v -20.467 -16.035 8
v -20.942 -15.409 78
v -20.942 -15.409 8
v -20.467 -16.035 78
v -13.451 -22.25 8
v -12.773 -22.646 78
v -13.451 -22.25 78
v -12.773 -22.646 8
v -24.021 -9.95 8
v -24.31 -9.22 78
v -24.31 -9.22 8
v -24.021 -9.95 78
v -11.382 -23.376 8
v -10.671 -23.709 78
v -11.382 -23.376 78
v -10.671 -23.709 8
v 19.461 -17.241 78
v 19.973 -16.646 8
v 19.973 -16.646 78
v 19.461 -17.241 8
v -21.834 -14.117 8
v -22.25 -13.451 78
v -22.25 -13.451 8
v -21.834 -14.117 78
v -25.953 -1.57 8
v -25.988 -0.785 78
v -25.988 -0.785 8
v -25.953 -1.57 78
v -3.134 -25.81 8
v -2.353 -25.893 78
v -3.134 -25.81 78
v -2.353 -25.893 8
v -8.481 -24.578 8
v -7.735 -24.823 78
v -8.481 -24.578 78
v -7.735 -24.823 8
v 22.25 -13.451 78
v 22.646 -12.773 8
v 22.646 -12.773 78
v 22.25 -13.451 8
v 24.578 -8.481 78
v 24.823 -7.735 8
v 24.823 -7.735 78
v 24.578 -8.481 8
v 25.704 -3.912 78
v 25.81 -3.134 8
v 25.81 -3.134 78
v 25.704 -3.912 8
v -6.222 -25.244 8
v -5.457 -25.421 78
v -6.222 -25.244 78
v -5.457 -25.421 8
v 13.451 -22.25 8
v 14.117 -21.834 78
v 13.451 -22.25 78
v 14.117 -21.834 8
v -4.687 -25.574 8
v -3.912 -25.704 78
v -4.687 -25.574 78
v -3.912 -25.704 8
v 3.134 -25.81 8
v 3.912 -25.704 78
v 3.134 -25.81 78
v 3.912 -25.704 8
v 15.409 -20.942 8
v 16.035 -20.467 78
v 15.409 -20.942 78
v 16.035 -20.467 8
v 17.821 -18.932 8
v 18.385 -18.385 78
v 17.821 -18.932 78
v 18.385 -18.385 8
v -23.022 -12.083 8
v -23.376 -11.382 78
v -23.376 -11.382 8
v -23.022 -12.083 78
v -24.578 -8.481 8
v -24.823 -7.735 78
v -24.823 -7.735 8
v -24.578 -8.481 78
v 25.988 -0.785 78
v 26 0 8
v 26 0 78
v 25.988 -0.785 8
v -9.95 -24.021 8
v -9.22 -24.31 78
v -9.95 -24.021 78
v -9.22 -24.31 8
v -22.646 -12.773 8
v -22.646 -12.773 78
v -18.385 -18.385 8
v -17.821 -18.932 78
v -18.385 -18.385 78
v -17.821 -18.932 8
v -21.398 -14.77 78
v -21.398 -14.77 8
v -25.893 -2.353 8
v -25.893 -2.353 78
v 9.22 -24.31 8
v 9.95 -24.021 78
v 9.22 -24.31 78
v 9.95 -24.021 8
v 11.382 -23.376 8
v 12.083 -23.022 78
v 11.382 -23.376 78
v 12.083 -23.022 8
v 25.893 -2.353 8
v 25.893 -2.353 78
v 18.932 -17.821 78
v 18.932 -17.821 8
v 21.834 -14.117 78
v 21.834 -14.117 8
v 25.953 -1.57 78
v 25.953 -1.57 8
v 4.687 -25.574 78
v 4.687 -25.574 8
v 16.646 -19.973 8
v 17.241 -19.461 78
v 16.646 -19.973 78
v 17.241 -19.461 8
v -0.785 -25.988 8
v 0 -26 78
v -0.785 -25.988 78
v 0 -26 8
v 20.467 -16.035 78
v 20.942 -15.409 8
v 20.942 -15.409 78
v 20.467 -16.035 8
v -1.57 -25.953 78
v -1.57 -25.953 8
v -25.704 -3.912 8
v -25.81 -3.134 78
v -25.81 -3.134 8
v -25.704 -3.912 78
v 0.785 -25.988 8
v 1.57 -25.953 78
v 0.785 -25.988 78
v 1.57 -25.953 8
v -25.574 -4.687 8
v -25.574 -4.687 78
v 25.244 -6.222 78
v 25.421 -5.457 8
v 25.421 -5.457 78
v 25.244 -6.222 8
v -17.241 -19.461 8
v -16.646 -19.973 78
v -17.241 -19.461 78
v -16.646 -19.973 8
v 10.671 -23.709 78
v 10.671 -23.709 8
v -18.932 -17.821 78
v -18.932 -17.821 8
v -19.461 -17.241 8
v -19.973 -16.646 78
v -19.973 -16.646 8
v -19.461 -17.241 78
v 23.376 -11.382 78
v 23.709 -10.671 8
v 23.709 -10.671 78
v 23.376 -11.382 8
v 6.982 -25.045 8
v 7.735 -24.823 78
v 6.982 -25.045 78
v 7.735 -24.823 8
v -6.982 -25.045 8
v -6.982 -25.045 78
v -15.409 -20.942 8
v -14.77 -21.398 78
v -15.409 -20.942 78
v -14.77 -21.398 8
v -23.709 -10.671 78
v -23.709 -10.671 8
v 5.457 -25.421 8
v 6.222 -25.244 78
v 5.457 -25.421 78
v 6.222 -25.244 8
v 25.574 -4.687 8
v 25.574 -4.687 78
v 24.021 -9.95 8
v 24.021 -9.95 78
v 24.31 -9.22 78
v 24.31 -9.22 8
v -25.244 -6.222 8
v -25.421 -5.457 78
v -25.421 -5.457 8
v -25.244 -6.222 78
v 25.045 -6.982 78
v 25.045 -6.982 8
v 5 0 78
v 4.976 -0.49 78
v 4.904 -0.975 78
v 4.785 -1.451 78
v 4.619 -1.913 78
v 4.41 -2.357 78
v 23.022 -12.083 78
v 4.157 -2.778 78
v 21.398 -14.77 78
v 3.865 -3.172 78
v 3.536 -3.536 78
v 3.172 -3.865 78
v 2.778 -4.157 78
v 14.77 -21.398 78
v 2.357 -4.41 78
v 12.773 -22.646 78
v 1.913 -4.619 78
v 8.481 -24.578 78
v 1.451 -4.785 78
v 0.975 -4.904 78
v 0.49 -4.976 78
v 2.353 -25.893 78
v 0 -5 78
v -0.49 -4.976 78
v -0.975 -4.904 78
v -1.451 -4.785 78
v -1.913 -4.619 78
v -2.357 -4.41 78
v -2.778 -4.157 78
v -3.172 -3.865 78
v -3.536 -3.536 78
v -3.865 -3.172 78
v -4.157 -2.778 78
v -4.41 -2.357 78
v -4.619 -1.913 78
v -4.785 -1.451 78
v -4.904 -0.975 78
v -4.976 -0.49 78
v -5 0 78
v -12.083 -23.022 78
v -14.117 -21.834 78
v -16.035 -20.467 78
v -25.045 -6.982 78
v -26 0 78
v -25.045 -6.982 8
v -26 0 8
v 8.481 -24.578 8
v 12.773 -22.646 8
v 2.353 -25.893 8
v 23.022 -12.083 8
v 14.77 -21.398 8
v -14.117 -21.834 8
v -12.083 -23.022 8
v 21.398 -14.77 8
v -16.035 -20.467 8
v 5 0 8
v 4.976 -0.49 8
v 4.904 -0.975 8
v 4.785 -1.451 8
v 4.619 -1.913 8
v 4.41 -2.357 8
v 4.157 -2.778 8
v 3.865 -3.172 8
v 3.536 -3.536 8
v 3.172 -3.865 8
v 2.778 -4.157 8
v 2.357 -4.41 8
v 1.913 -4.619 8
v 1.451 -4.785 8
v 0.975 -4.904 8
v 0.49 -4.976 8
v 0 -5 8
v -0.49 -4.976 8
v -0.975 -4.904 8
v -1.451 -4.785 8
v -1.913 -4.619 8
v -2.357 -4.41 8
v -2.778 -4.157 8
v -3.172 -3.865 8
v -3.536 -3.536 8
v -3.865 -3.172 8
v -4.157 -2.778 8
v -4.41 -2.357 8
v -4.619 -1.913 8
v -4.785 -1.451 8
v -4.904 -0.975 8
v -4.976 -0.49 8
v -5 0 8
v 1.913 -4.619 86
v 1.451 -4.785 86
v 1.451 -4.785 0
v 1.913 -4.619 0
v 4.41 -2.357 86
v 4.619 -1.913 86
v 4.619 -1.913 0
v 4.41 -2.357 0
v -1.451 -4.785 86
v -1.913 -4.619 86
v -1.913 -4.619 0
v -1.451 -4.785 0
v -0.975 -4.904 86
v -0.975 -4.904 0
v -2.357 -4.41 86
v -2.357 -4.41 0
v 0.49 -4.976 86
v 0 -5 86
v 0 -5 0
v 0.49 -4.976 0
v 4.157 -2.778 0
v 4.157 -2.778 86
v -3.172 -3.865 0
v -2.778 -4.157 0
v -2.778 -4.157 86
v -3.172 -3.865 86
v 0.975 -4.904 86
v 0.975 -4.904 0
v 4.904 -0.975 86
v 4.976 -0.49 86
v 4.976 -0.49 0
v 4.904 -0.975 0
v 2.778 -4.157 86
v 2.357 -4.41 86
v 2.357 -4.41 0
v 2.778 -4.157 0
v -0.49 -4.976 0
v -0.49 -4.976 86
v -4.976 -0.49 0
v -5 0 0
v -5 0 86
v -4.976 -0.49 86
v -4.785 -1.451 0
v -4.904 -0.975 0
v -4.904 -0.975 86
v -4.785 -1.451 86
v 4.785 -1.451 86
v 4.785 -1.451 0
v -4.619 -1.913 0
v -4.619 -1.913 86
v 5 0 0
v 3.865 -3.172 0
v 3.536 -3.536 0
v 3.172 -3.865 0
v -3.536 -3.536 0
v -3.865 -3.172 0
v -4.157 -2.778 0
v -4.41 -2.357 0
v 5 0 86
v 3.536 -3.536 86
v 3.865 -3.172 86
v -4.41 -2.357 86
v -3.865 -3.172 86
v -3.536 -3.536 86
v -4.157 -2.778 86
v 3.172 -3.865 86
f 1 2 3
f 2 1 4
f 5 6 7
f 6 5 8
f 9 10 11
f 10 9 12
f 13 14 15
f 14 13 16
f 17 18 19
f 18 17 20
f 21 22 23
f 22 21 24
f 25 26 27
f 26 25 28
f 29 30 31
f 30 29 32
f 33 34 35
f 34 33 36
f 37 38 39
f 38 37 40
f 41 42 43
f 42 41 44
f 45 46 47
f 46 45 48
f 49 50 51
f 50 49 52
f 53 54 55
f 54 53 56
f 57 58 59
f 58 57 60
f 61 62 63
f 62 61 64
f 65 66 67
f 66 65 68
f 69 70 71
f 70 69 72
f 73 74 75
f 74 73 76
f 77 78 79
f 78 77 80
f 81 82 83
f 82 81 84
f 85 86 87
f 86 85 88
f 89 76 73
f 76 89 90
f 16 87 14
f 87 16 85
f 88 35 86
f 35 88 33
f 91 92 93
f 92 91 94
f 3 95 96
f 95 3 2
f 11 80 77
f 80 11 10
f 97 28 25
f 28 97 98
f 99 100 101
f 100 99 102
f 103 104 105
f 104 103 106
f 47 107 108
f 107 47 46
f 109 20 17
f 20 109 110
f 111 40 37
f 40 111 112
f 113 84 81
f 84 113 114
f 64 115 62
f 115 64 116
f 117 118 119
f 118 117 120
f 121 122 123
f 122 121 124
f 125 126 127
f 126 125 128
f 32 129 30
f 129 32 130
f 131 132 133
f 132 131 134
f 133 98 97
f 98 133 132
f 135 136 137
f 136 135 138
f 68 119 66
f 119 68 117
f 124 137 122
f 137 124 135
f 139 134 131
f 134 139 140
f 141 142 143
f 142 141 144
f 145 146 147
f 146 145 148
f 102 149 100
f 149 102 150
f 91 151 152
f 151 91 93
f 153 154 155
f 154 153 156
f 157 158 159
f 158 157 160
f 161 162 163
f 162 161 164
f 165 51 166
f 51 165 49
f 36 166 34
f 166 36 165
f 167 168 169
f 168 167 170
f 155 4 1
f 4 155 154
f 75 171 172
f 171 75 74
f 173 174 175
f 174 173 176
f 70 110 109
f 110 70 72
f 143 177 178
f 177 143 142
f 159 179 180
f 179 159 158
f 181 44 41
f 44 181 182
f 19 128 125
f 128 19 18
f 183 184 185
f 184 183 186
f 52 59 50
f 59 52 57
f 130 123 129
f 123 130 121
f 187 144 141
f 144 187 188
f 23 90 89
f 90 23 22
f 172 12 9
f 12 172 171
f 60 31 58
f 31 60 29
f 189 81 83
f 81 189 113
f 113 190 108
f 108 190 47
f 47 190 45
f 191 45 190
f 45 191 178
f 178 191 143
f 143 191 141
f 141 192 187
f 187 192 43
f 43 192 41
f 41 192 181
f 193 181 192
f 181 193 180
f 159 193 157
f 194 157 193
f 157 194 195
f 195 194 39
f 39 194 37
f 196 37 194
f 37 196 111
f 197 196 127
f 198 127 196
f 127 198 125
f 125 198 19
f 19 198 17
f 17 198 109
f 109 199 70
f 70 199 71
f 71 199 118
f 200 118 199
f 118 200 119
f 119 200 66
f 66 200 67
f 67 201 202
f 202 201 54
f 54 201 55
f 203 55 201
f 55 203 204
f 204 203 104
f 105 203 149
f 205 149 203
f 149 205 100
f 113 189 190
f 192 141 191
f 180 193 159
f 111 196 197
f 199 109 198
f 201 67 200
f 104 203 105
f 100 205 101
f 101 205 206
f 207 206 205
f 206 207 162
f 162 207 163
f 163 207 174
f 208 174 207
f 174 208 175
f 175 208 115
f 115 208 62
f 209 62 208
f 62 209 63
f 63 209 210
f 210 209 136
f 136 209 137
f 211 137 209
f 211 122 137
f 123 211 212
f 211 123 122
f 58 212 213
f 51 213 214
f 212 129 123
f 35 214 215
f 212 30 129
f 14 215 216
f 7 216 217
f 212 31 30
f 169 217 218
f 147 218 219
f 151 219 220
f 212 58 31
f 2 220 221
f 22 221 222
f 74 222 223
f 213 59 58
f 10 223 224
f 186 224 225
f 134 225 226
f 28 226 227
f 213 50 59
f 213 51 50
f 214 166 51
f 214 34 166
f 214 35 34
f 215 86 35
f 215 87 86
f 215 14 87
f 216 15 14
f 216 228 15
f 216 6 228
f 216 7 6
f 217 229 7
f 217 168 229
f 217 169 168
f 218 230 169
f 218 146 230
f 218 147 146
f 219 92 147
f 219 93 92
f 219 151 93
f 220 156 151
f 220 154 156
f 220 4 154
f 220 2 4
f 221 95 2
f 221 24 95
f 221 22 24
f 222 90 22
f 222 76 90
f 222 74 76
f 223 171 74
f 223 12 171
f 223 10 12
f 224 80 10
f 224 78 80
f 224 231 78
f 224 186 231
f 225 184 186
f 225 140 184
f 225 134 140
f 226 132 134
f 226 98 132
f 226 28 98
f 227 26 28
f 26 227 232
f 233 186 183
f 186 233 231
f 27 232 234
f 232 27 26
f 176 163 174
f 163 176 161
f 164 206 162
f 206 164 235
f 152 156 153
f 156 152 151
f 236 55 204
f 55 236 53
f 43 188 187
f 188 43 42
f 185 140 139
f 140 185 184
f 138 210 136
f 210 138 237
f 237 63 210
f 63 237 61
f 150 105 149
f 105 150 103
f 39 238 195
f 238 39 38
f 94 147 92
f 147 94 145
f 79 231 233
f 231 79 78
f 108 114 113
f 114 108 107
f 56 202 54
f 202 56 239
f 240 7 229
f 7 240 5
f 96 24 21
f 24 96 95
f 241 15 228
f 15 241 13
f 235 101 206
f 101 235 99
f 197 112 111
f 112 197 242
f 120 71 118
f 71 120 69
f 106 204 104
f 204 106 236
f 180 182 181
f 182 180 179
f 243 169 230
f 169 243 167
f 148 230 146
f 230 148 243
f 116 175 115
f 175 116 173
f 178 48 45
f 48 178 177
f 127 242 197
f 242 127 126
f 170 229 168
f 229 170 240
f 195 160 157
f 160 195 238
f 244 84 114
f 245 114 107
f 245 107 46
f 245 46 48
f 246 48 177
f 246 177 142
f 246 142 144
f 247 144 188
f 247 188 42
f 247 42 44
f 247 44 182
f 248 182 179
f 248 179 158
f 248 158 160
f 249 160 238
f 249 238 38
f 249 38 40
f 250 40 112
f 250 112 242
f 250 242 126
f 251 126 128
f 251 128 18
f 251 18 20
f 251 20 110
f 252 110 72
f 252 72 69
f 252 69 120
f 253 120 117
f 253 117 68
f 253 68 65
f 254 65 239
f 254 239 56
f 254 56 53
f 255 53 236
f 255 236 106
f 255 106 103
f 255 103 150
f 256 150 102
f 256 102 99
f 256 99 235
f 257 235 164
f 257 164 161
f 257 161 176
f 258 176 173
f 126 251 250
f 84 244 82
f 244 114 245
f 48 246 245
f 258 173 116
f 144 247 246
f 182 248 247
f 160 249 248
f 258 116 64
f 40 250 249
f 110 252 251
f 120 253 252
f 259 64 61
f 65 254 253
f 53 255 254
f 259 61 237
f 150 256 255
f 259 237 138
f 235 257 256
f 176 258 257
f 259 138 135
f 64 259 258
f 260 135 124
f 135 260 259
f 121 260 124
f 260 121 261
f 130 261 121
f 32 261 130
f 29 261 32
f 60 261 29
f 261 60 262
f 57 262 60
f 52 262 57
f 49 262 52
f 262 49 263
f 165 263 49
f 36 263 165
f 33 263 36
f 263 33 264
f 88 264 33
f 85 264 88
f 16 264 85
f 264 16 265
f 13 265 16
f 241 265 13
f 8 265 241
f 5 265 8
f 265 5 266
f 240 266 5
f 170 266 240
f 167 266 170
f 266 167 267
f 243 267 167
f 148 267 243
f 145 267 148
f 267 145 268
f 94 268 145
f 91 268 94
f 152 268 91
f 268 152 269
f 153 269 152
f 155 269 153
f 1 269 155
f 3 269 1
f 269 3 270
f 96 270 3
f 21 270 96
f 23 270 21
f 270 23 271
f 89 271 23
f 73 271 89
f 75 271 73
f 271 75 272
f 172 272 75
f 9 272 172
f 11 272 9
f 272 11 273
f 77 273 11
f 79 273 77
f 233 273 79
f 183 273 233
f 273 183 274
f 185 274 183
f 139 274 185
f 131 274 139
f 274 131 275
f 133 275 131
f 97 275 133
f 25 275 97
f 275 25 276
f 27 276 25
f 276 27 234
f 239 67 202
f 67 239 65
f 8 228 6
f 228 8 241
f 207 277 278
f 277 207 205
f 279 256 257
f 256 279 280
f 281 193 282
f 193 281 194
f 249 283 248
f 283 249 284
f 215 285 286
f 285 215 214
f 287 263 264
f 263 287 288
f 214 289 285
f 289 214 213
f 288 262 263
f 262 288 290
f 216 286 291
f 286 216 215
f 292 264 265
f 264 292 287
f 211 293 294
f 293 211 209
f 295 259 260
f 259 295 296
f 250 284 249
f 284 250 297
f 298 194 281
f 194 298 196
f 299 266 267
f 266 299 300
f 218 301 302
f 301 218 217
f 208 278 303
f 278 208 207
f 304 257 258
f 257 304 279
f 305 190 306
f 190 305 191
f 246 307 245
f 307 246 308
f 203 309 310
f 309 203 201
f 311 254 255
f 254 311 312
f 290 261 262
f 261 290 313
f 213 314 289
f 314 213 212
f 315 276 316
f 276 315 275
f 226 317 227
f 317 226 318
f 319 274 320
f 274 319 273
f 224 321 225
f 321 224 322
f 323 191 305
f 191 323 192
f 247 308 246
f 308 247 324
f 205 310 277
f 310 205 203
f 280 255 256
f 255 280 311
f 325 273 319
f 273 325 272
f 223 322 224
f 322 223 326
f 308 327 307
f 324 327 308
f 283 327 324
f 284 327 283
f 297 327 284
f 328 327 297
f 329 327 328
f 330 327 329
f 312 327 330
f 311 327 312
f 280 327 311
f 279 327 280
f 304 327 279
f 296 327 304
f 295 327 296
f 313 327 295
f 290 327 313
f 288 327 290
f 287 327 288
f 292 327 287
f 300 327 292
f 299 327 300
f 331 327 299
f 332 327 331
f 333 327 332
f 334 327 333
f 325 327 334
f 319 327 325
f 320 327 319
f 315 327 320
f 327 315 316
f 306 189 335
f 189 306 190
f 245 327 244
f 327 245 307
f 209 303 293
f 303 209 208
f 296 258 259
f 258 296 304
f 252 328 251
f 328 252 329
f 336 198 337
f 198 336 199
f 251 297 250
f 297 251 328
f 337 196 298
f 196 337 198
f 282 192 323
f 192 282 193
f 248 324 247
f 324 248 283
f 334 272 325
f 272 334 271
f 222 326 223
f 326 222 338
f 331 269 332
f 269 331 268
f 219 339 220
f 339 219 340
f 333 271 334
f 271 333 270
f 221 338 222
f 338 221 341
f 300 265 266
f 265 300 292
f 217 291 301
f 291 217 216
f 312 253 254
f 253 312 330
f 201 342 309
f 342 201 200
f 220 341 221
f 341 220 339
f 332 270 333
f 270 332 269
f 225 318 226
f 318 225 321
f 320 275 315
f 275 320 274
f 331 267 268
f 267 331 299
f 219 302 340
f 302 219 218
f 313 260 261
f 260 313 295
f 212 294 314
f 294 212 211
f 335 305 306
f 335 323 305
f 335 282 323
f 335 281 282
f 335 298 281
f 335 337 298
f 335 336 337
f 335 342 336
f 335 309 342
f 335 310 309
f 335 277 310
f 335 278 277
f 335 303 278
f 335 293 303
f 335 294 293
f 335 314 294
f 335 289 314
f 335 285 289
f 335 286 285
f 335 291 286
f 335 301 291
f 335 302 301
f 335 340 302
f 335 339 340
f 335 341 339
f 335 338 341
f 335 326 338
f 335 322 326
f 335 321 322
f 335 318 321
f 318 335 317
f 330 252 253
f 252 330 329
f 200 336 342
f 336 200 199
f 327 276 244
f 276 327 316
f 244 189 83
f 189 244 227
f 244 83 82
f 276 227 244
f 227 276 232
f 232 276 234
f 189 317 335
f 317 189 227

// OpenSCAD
module PrintOrientation(){
  difference(){
    union(){
      translate([0, 0, 8])cylinder(d=52,h=70,$fn=208);
      cylinder(d=10,h=86,$fn=64);
    }

    translate([0, 0, -0.004])linear_extrude(height=86.008)translate([-26, 0, 0])square([52, 52]);
  }
}
$fn=64;
color("gold")PrintOrientation();
